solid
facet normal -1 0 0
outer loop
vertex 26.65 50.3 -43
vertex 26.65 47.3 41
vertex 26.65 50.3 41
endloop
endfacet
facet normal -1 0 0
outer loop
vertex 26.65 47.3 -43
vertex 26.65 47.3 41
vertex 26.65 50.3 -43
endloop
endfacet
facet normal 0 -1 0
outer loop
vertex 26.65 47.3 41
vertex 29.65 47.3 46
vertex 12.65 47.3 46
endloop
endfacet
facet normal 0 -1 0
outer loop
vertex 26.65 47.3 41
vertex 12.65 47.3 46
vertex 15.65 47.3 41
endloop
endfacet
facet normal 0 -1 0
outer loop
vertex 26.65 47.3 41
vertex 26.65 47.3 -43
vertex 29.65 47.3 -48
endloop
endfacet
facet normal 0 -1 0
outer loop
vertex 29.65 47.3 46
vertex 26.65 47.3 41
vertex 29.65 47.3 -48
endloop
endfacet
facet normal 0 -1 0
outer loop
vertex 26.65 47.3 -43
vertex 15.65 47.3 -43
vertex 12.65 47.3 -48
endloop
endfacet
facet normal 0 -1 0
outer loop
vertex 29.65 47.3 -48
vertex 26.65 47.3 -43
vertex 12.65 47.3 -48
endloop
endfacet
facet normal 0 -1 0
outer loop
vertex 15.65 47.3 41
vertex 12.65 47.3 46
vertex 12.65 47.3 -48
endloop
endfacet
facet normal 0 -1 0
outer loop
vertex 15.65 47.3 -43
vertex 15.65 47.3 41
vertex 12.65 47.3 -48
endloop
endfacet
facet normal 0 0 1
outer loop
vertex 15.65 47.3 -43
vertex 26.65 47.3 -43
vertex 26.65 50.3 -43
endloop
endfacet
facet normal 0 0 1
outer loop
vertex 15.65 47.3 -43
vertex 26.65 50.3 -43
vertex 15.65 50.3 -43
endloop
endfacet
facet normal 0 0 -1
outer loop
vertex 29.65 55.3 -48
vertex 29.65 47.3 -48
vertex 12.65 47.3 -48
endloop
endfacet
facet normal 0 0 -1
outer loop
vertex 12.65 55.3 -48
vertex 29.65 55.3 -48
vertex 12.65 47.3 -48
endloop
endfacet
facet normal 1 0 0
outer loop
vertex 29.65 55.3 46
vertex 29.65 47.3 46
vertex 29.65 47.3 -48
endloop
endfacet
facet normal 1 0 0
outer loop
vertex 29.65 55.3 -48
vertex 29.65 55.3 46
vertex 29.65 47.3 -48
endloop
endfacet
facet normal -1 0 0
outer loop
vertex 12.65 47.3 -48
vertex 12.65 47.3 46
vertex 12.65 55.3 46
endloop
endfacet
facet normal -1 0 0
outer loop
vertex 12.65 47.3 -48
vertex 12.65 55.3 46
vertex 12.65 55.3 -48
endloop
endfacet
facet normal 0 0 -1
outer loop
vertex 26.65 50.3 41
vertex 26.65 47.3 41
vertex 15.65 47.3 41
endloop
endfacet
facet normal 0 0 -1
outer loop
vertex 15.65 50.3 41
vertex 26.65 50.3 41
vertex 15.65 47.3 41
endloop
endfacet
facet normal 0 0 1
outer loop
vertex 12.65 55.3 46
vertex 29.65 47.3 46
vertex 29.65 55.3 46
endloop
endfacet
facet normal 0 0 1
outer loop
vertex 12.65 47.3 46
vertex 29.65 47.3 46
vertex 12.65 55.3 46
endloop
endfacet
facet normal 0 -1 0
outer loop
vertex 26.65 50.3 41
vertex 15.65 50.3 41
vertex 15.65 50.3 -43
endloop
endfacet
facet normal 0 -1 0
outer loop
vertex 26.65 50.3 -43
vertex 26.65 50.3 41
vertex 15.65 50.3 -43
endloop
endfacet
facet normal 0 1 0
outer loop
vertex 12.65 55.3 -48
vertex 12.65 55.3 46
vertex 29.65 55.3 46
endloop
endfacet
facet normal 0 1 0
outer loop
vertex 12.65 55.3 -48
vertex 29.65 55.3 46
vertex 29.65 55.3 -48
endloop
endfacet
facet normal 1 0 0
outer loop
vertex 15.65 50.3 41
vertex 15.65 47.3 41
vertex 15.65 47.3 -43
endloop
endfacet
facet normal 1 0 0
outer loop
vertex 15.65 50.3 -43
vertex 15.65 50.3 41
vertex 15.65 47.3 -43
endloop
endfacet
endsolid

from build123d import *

# Parameters (mm, degrees)
BOX009_W               = 84
BOX009_H               = 11
BOX009_DEPTH           = 5
BOX008_W               = 94
BOX008_H               = 17
BOX008_DEPTH           = 8
CUT009_PITCH_ANGLE     = 90
CUT009_PLACEMENT_ANGLE = 90


with BuildPart() as slidemodulenegative:
    # Box009 → Box009 (new body)
    with BuildSketch(Plane.XY.offset(-2)):
        with Locations((42, 5.5)):
            Rectangle(BOX009_W, BOX009_H)
    extrude(amount=BOX009_DEPTH)


with BuildPart() as slidingmodule:
    # Box008 → Box008 (new body)
    with BuildSketch(Plane(origin=(-5, -3, 0), x_dir=(1, 0, 0), z_dir=(0, 0, 1))):
        with Locations((47, 8.5)):
            Rectangle(BOX008_W, BOX008_H)
    extrude(amount=BOX008_DEPTH)

    # Cut009: cut SlideModuleNegative
    add(slidemodulenegative.part, mode=Mode.SUBTRACT)


with BuildPart() as slidingmodule_1:
    # Cut009 pitch: moved
    add(slidingmodule.part.rotate(Axis((0, 0, 0), (0, 1, 0)), CUT009_PITCH_ANGLE))


with BuildPart() as slidingmodule_2:
    # Cut009 placement: moved
    add(slidingmodule_1.part.moved(Location((26.65, 47.3, 41))).rotate(Axis((26.65, 47.3, 41), (0, 0, 1)), CUT009_PLACEMENT_ANGLE))


solid = slidingmodule_2.part
